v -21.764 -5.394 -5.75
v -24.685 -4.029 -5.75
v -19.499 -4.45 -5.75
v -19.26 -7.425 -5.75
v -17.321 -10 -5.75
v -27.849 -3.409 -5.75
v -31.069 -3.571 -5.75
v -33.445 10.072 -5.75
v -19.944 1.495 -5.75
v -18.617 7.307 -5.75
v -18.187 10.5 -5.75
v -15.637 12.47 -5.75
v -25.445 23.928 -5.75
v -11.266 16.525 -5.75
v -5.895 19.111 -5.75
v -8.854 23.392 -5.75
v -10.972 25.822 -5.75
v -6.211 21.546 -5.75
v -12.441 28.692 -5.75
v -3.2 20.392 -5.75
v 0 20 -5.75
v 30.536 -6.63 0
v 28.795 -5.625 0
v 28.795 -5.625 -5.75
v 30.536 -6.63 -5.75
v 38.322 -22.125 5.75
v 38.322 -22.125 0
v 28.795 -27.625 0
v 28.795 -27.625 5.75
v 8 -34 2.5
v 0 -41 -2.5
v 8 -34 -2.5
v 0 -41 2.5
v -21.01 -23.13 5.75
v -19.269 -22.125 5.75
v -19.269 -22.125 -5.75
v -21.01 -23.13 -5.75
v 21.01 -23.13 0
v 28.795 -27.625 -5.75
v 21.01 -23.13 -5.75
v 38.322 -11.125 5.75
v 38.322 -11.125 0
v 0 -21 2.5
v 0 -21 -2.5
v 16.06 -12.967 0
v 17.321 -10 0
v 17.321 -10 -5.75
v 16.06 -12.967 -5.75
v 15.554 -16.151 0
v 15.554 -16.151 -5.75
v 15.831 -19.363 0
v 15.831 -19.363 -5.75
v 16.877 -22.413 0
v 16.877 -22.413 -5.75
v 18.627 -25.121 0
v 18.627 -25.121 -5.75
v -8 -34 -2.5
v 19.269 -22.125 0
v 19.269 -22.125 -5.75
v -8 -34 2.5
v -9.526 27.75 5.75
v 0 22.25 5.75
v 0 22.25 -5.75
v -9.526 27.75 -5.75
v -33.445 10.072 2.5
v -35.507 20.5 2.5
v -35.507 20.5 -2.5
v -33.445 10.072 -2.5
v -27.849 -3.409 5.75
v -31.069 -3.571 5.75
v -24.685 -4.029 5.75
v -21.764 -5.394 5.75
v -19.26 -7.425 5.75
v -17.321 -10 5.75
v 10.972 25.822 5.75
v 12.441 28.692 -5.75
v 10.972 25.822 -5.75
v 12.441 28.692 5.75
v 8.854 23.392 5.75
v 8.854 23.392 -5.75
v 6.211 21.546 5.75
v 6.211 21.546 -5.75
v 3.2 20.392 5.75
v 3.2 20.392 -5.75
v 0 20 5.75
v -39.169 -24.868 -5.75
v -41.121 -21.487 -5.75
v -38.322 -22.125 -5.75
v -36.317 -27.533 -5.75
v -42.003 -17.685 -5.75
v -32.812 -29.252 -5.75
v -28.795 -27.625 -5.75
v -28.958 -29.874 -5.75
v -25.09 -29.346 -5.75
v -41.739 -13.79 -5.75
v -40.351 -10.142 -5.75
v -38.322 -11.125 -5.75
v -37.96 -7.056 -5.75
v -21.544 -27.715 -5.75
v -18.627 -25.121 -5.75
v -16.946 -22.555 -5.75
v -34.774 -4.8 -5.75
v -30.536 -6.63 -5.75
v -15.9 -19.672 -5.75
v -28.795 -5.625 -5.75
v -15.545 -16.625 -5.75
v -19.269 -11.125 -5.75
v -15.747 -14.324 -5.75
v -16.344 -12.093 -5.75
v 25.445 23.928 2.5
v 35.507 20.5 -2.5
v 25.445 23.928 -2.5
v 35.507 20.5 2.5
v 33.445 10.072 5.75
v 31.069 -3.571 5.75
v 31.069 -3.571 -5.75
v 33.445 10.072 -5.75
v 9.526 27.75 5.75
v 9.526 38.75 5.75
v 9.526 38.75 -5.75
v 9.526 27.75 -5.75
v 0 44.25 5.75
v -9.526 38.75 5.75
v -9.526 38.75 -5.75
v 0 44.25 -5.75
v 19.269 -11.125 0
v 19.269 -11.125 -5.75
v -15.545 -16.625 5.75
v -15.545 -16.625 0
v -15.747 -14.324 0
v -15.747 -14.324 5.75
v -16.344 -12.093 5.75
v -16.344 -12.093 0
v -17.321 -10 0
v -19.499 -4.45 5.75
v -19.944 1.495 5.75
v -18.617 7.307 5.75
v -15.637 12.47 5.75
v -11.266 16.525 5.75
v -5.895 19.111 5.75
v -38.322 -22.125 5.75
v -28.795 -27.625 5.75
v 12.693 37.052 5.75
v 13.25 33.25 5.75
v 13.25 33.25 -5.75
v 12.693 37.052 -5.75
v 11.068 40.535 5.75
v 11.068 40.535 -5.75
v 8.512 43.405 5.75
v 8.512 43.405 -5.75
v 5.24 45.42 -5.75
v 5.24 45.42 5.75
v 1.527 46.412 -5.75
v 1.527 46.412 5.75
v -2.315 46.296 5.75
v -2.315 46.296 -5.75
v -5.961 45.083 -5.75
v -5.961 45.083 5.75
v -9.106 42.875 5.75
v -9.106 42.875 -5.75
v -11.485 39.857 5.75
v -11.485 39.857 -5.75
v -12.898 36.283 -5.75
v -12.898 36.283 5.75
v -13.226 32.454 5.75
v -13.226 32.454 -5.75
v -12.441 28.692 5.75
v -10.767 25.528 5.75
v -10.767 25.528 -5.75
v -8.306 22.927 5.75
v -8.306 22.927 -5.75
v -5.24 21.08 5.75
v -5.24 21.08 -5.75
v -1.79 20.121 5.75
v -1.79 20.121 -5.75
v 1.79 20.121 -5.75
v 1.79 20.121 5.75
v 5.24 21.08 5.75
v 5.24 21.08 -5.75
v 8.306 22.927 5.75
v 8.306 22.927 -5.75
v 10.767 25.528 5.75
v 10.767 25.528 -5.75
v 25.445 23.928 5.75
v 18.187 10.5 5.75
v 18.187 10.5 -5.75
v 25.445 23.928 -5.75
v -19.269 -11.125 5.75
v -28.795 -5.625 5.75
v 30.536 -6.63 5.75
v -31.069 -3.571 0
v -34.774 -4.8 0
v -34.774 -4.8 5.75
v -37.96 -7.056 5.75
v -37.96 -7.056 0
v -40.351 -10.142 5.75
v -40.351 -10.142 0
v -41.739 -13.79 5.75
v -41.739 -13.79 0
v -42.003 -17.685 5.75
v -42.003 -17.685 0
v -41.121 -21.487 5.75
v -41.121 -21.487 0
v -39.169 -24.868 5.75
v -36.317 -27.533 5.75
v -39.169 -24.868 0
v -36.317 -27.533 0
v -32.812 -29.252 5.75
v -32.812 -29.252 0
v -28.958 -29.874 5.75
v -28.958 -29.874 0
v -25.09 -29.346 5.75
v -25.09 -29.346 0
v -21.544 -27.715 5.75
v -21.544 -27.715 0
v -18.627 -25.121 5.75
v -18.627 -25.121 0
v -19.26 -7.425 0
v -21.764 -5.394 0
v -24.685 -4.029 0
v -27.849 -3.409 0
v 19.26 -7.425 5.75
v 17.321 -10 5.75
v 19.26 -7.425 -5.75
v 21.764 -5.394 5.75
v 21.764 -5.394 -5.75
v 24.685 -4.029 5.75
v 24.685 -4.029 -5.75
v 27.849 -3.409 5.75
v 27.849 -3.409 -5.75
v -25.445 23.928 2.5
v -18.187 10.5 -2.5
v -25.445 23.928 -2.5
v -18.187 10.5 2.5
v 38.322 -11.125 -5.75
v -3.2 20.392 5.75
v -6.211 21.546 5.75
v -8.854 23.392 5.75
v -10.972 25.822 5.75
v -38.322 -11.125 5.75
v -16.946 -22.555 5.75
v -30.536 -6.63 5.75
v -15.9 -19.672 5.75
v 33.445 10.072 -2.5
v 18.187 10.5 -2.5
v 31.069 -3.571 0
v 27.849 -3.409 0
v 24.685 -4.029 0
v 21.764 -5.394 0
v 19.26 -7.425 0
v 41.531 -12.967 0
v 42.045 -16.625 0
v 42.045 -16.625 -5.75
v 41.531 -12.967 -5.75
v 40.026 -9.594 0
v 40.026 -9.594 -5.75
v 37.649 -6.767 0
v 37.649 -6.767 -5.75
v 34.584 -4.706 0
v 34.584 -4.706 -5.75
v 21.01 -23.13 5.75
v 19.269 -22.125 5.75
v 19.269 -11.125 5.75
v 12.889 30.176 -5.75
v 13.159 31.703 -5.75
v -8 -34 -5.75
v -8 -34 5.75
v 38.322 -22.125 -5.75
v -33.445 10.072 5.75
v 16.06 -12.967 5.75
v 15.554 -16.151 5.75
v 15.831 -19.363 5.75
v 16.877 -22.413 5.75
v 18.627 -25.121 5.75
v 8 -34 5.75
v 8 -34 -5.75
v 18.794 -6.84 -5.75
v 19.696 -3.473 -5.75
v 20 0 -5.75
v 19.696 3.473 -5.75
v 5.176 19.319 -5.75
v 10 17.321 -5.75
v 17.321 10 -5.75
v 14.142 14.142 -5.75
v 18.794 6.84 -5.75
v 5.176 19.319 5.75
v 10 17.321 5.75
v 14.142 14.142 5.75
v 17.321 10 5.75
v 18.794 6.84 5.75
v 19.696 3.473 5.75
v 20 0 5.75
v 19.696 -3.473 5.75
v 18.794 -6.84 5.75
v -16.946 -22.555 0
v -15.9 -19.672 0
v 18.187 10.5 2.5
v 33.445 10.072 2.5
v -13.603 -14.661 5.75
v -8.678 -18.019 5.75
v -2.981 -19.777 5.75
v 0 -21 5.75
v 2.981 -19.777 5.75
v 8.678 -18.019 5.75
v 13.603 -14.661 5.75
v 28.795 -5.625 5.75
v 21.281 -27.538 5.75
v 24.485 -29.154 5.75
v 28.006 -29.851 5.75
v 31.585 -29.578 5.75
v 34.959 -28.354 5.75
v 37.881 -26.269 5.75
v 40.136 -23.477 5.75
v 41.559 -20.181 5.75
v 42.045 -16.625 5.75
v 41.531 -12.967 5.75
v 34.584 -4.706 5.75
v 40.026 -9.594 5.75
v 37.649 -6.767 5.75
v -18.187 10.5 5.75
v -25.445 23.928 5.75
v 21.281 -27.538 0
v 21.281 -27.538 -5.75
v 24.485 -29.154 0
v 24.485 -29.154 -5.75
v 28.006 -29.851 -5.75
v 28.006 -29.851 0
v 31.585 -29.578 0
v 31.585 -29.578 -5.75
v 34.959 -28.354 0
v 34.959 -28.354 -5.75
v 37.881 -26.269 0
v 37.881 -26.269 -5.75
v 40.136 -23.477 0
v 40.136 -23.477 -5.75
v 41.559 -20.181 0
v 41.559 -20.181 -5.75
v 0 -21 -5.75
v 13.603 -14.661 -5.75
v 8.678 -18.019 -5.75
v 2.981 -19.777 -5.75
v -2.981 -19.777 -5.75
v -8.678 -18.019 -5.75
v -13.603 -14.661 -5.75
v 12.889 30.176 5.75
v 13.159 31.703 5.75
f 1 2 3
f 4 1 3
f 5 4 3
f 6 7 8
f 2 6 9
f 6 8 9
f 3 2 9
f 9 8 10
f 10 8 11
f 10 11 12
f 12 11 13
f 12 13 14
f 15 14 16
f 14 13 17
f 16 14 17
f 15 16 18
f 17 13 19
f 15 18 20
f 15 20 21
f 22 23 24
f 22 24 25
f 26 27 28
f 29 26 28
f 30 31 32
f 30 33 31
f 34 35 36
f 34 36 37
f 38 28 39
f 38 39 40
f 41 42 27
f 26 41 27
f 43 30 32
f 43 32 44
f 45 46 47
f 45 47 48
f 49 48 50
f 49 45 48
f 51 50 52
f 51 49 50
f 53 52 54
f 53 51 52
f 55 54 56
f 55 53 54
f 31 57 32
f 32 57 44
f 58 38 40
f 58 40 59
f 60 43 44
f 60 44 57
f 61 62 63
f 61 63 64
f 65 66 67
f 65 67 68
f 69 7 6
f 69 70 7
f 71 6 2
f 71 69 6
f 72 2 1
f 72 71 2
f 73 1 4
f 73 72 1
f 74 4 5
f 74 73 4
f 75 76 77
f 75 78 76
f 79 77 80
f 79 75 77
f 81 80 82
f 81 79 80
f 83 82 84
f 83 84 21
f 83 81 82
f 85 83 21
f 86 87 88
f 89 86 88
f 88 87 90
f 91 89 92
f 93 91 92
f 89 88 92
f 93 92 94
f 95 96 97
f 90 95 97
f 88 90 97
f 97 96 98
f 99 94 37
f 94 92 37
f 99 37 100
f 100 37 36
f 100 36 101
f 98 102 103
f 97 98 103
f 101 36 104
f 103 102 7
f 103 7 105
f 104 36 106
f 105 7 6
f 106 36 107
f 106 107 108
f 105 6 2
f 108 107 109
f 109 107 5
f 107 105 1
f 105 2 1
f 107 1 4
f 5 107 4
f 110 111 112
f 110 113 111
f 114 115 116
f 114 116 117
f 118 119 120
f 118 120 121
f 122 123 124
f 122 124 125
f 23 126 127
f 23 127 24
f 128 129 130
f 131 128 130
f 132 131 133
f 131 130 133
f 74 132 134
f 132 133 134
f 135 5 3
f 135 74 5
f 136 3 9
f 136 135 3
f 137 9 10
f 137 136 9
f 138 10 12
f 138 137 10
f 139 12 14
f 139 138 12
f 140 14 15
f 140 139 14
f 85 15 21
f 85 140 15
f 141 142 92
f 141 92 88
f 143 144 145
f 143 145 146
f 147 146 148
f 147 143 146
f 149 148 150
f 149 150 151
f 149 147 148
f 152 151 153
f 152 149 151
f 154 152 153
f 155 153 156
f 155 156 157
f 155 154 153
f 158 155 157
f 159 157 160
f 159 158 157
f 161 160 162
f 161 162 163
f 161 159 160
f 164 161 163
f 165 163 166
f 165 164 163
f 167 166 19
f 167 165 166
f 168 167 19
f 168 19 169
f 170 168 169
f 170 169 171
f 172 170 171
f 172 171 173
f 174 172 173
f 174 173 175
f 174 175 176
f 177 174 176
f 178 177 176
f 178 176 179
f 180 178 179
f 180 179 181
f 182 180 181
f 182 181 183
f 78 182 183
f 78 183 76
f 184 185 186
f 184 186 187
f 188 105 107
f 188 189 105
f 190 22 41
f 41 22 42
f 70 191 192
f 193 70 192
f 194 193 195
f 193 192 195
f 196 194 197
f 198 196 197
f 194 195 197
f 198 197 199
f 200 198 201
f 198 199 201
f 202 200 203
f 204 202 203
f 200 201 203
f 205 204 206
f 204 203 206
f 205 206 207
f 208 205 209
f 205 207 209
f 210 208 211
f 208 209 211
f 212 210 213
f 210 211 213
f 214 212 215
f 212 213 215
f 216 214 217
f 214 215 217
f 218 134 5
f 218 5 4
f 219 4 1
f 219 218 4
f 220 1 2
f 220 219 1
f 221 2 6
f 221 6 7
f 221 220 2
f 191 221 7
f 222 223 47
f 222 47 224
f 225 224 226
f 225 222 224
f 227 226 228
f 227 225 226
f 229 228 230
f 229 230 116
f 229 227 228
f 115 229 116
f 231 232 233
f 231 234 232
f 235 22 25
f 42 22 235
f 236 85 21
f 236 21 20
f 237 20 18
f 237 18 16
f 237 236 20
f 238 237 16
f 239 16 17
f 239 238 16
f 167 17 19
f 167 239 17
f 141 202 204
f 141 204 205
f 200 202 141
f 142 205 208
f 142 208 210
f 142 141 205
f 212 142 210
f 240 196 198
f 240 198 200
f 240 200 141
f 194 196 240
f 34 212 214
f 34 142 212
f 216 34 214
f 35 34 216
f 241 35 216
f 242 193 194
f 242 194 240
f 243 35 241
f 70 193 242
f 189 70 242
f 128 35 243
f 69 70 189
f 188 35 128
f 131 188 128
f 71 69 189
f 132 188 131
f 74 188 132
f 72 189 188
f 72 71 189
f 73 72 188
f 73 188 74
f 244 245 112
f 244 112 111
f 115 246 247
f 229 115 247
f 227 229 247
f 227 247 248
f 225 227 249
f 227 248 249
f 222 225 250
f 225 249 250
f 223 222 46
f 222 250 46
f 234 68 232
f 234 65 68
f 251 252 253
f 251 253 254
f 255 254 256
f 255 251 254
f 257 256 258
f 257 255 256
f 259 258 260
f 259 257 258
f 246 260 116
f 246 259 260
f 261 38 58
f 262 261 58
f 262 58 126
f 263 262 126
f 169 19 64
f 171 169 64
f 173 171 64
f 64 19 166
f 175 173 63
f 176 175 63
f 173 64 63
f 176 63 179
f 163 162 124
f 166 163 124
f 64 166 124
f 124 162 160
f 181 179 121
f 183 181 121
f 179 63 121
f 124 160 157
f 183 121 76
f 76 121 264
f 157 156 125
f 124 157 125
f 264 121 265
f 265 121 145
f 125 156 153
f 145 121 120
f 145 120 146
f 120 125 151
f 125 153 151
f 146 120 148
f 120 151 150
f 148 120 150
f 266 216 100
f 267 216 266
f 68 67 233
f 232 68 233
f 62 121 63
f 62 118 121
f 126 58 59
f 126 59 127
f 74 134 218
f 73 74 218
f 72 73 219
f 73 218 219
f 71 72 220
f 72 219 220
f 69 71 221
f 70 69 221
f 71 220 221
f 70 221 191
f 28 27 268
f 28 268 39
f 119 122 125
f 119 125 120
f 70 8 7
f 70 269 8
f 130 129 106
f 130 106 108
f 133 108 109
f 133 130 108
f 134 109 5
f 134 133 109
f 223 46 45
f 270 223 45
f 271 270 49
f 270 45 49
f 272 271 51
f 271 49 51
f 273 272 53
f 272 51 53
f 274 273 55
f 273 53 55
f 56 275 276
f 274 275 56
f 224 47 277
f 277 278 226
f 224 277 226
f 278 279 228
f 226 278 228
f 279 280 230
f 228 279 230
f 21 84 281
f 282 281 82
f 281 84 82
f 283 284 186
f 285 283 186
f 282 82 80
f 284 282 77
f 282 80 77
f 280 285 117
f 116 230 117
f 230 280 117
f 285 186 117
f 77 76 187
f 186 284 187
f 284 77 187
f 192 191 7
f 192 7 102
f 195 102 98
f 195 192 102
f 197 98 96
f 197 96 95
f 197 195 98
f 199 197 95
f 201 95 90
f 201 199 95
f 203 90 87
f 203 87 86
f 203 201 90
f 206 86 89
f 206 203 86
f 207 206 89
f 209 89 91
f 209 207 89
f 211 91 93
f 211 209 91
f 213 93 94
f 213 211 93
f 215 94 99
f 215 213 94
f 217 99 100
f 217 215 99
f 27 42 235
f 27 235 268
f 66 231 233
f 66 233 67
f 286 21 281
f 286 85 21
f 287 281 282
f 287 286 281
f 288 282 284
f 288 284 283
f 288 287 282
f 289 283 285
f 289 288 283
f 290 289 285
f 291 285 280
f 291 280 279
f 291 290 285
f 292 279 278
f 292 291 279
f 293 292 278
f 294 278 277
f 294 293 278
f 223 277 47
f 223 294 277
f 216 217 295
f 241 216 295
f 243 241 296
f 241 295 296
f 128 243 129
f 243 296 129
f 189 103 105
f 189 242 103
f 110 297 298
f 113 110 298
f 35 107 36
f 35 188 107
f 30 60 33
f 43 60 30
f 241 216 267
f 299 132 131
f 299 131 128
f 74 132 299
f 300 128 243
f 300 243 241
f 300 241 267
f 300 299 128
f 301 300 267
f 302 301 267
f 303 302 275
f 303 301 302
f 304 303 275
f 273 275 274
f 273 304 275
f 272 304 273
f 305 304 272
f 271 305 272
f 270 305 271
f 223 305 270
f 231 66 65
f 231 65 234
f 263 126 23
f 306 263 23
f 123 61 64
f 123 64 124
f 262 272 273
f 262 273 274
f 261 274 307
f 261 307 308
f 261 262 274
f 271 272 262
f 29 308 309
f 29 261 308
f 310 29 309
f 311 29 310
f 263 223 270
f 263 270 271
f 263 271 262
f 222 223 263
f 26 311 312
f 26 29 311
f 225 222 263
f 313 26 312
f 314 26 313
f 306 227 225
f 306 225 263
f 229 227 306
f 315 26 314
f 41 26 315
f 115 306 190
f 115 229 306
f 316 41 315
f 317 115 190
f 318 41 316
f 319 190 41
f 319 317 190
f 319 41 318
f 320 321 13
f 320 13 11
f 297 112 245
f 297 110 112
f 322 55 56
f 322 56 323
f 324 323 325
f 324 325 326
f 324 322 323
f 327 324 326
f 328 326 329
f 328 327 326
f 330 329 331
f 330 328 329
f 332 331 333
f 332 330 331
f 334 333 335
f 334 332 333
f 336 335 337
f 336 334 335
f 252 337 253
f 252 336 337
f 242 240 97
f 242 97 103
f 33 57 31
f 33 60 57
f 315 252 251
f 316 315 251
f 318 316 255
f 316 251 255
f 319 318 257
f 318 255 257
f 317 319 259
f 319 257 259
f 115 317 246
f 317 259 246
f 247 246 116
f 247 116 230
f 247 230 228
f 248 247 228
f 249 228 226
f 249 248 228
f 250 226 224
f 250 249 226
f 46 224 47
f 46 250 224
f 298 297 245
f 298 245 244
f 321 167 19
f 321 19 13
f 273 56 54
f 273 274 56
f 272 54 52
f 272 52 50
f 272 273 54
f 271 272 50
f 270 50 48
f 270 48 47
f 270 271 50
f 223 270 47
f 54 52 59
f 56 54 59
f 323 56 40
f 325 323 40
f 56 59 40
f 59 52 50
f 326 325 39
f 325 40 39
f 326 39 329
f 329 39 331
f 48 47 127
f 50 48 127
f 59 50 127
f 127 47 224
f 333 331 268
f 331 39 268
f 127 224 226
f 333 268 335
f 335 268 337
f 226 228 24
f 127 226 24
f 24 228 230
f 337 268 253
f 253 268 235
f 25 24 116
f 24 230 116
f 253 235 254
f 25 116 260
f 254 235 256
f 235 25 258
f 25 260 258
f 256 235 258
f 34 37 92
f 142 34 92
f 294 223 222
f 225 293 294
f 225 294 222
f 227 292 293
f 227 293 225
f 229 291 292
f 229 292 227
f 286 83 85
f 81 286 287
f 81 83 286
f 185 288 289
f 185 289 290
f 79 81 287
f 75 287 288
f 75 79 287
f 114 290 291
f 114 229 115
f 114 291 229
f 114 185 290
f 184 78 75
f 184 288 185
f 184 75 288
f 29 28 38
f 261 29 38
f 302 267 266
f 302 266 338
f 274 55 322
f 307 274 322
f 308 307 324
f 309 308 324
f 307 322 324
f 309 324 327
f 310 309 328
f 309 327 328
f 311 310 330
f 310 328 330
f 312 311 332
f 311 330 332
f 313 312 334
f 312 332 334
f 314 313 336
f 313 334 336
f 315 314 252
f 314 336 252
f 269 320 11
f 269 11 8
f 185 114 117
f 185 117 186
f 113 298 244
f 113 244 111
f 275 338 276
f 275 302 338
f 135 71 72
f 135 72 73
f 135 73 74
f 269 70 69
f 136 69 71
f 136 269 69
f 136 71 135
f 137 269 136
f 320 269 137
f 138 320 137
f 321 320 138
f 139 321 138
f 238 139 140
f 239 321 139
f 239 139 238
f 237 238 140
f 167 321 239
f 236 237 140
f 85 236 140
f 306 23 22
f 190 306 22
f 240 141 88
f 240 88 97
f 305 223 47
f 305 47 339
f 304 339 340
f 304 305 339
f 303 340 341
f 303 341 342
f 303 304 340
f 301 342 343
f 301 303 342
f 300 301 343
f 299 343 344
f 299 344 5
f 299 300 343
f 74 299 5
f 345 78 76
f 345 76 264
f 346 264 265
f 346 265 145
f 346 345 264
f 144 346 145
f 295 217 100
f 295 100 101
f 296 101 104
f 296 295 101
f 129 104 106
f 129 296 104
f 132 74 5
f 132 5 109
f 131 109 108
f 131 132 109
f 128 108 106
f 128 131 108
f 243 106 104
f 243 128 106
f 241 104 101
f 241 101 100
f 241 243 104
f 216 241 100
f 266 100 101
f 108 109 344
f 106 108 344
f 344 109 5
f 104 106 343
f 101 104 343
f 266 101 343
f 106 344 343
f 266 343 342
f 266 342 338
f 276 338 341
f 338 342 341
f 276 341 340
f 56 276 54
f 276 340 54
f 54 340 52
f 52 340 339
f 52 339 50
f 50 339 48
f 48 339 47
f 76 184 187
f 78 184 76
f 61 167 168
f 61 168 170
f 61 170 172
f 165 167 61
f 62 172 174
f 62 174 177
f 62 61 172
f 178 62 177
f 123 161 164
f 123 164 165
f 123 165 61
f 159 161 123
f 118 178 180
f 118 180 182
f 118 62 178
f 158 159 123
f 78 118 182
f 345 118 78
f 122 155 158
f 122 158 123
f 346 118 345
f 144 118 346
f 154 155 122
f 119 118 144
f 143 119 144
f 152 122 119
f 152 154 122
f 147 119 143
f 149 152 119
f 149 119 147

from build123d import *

# Parameters (mm, degrees)
F1_DEPTH = 5.75
F2_DEPTH = 2.5
F3_DEPTH = 5.75


with BuildPart() as f1:
    # F0 (on Top) → F1 (new body, symmetric)
    with BuildSketch(Plane.XY):
        with BuildLine():
            ThreePointArc((4.1e-09, 20), (10.0000000018, 17.3205080747), (17.3205080757, 10))
            Line((17.3205080757, 10), (18.1865334795, 10.5))
            Line((18.1865334795, 10.5), (25.4448637287, 23.9282032303))
            Line((25.4448637287, 23.9282032303), (12.4413728802, 28.6920683576))
            ThreePointArc((12.4413728802, 28.6920683576), (7.5884750046, 22.3882530362), (4.1e-09, 20))
        make_face()
        with BuildLine():
            ThreePointArc((17.3205080757, 10), (19.3185165258, 5.1763809021), (20, 0))
            ThreePointArc((20, 0), (19.3185165739, -5.1763807226), (17.3205082615, -9.9999996782))
            ThreePointArc((17.3205082615, -9.9999996782), (23.1830335444, -4.6223143104), (31.0687465249, -3.5714892066))
            Line((31.0687465249, -3.5714892066), (33.4448637287, 10.0717967697))
            Line((33.4448637287, 10.0717967697), (18.1865334795, 10.5))
            Line((18.1865334795, 10.5), (17.3205080757, 10))
        make_face()
    extrude(amount=F1_DEPTH, both=True)


with BuildPart() as f1b:
    # F0 (on Top) → F1, piece 2 (new body, symmetric)
    with BuildSketch(Plane.XY):
        with BuildLine():
            ThreePointArc((18.6273736447, -25.120579151), (15.5945583573, -17.7659384609), (17.3205082615, -9.9999996782))
            ThreePointArc((17.3205082615, -9.9999996782), (1.727e-07, -20), (-17.3205080887, -9.9999999774))
            ThreePointArc((-17.3205080887, -9.9999999774), (-15.9968274809, -13.1956476398), (-15.5453446758, -16.625))
            ThreePointArc((-15.5453446758, -16.625), (-16.3396609097, -21.1436770098), (-18.6273736447, -25.120579151))
            Line((-18.6273736447, -25.120579151), (-8, -34))
            Line((-8, -34), (0, -21))
            Line((0, -21), (8, -34))
            Line((8, -34), (18.6273736447, -25.120579151))
        make_face()
    extrude(amount=F1_DEPTH, both=True)


with BuildPart() as f1c:
    # F0 (on Top) → F1, piece 3 (new body, symmetric)
    with BuildSketch(Plane.XY):
        with BuildLine():
            ThreePointArc((-17.3205080887, -9.9999999774), (-17.3205080681, 10.0000000131), (4.1e-09, 20))
            ThreePointArc((4.1e-09, 20), (-7.5884750012, 22.3882530339), (-12.4413728802, 28.6920683576))
            Line((-12.4413728802, 28.6920683576), (-25.4448637287, 23.9282032303))
            Line((-25.4448637287, 23.9282032303), (-18.1865334795, 10.5))
            Line((-18.1865334795, 10.5), (-33.4448637287, 10.0717967697))
            Line((-33.4448637287, 10.0717967697), (-31.0687465249, -3.5714892066))
            ThreePointArc((-31.0687465249, -3.5714892066), (-23.183033388, -4.6223143835), (-17.3205080887, -9.9999999774))
        make_face()
    extrude(amount=F1_DEPTH, both=True)


with BuildPart() as f2:
    # F0 (on Top) → F2 (new body, symmetric)
    with BuildSketch(Plane.XY):
        Polygon((25.4448637287, 23.9282032303), (18.1865334795, 10.5), (29.4448637287, 17), (35.5070415552, 20.5), align=None)
        Polygon((35.5070415552, 20.5), (29.4448637287, 17), (33.4448637287, 10.0717967697), align=None)
        Polygon((29.4448637287, 17), (18.1865334795, 10.5), (33.4448637287, 10.0717967697), align=None)
    extrude(amount=F2_DEPTH, both=True)


with BuildPart() as f2b:
    # F0 (on Top) → F2, piece 2 (new body, symmetric)
    with BuildSketch(Plane.XY):
        Polygon((-18.1865334795, 10.5), (-25.4448637287, 23.9282032303), (-35.5070415552, 20.5), (-33.4448637287, 10.0717967697), align=None)
    extrude(amount=F2_DEPTH, both=True)


with BuildPart() as f2c:
    # F0 (on Top) → F2, piece 3 (new body, symmetric)
    with BuildSketch(Plane.XY):
        Polygon((0, -41), (8, -34), (0, -21), (-8, -34), align=None)
    extrude(amount=F2_DEPTH, both=True)


with BuildPart() as f3:
    # F0 (on Top) → F3 (new body, symmetric)
    with BuildSketch(Plane.XY):
        with BuildLine():
            ThreePointArc((42.0453446758, -16.625), (38.9364756409, -8.097399942), (31.0687465249, -3.5714892066))
            Line((31.0687465249, -3.5714892066), (30.6826971543, -5.7881231149))
            ThreePointArc((30.6826971543, -5.7881231149), (35.0952107159, -7.6077006329), (38.3216241175, -11.125))
            ThreePointArc((38.3216241175, -11.125), (39.420528765, -13.7779905039), (39.7953446758, -16.625))
            ThreePointArc((39.7953446758, -16.625), (39.420528765, -19.4720094961), (38.3216241175, -22.125))
            ThreePointArc((38.3216241175, -22.125), (34.2953446758, -26.1512794416), (28.7953446758, -27.625))
            ThreePointArc((28.7953446758, -27.625), (24.1360673704, -26.5894937147), (20.3540102349, -23.6779336348))
            Line((20.3540102349, -23.6779336348), (18.6273736447, -25.120579151))
            ThreePointArc((18.6273736447, -25.120579151), (33.3140216856, -29.0806837661), (42.0453446758, -16.625))
        make_face()
        with BuildLine():
            ThreePointArc((38.3216241175, -11.125), (35.0952107159, -7.6077006329), (30.6826971543, -5.7881231149))
            Line((30.6826971543, -5.7881231149), (30.5360738949, -6.6300104832))
            Line((30.5360738949, -6.6300104832), (38.3216241175, -11.125))
        make_face()
        with BuildLine():
            ThreePointArc((39.7953446758, -16.625), (39.420528765, -13.7779905039), (38.3216241175, -11.125))
            Line((38.3216241175, -11.125), (38.3216241175, -22.125))
            ThreePointArc((38.3216241175, -22.125), (39.420528765, -19.4720094961), (39.7953446758, -16.625))
        make_face()
        with BuildLine():
            Line((38.3216241175, -22.125), (28.7953446758, -27.625))
            ThreePointArc((28.7953446758, -27.625), (34.2953446758, -26.1512794416), (38.3216241175, -22.125))
        make_face()
        with BuildLine():
            Line((21.0097944532, -23.1300104832), (20.3540102349, -23.6779336348))
            ThreePointArc((20.3540102349, -23.6779336348), (24.1360673704, -26.5894937147), (28.7953446758, -27.625))
            Line((28.7953446758, -27.625), (21.0097944532, -23.1300104832))
        make_face()
        with BuildLine():
            ThreePointArc((19.2690652342, -11.125), (17.7953446758, -16.625), (19.2690652342, -22.125))
            Line((19.2690652342, -22.125), (19.2690652342, -11.125))
        make_face()
        with BuildLine():
            Line((19.2690652342, -11.125), (28.7953446758, -5.625))
            ThreePointArc((28.7953446758, -5.625), (23.2953446758, -7.0987205584), (19.2690652342, -11.125))
        make_face()
        with BuildLine():
            Line((30.5360738949, -6.6300104832), (30.6826971543, -5.7881231149))
            ThreePointArc((30.6826971543, -5.7881231149), (29.7425390234, -5.6658566545), (28.7953446758, -5.625))
            Line((28.7953446758, -5.625), (30.5360738949, -6.6300104832))
        make_face()
        with BuildLine():
            ThreePointArc((31.0687465249, -3.5714892066), (23.1830335444, -4.6223143104), (17.3205082615, -9.9999996782))
            ThreePointArc((17.3205082615, -9.9999996782), (15.5945583573, -17.7659384609), (18.6273736447, -25.120579151))
            Line((18.6273736447, -25.120579151), (20.3540102349, -23.6779336348))
            ThreePointArc((20.3540102349, -23.6779336348), (19.7780453087, -22.9248660401), (19.2690652342, -22.125))
            ThreePointArc((19.2690652342, -22.125), (17.7953446758, -16.625), (19.2690652342, -11.125))
            ThreePointArc((19.2690652342, -11.125), (23.2953446758, -7.0987205584), (28.7953446758, -5.625))
            ThreePointArc((28.7953446758, -5.625), (29.7425390234, -5.6658566545), (30.6826971543, -5.7881231149))
            Line((30.6826971543, -5.7881231149), (31.0687465249, -3.5714892066))
        make_face()
        with BuildLine():
            ThreePointArc((19.2690652342, -22.125), (19.7780453087, -22.9248660401), (20.3540102349, -23.6779336348))
            Line((20.3540102349, -23.6779336348), (21.0097944532, -23.1300104832))
            Line((21.0097944532, -23.1300104832), (19.2690652342, -22.125))
        make_face()
    extrude(amount=F3_DEPTH, both=True)


with BuildPart() as f3b:
    # F0 (on Top) → F3, piece 2 (new body, symmetric)
    with BuildSketch(Plane.XY):
        with BuildLine():
            Line((-19.2690652342, -11.125), (-19.2690652342, -22.125))
            ThreePointArc((-19.2690652342, -22.125), (-18.1701605867, -19.4720094961), (-17.7953446758, -16.625))
            ThreePointArc((-17.7953446758, -16.625), (-18.1701605867, -13.7779905039), (-19.2690652342, -11.125))
        make_face()
        with BuildLine():
            ThreePointArc((-15.5453446758, -16.625), (-15.9968274809, -13.1956476398), (-17.3205080887, -9.9999999774))
            ThreePointArc((-17.3205080887, -9.9999999774), (-23.183033388, -4.6223143835), (-31.0687465249, -3.5714892066))
            Line((-31.0687465249, -3.5714892066), (-30.6826971543, -5.7881231149))
            ThreePointArc((-30.6826971543, -5.7881231149), (-29.7425390234, -5.6658566545), (-28.7953446758, -5.625))
            ThreePointArc((-28.7953446758, -5.625), (-23.2953446758, -7.0987205584), (-19.2690652342, -11.125))
            ThreePointArc((-19.2690652342, -11.125), (-18.1701605867, -13.7779905039), (-17.7953446758, -16.625))
            ThreePointArc((-17.7953446758, -16.625), (-18.1701605867, -19.4720094961), (-19.2690652342, -22.125))
            ThreePointArc((-19.2690652342, -22.125), (-19.7780453087, -22.9248660401), (-20.3540102349, -23.6779336348))
            Line((-20.3540102349, -23.6779336348), (-18.6273736447, -25.120579151))
            ThreePointArc((-18.6273736447, -25.120579151), (-16.3396609097, -21.1436770098), (-15.5453446758, -16.625))
        make_face()
        with BuildLine():
            Line((-21.0097944532, -23.1300104832), (-20.3540102349, -23.6779336348))
            ThreePointArc((-20.3540102349, -23.6779336348), (-19.7780453087, -22.9248660401), (-19.2690652342, -22.125))
            Line((-19.2690652342, -22.125), (-21.0097944532, -23.1300104832))
        make_face()
        with BuildLine():
            Line((-30.6826971543, -5.7881231149), (-31.0687465249, -3.5714892066))
            ThreePointArc((-31.0687465249, -3.5714892066), (-40.270181276, -23.25), (-18.6273736447, -25.120579151))
            Line((-18.6273736447, -25.120579151), (-20.3540102349, -23.6779336348))
            ThreePointArc((-20.3540102349, -23.6779336348), (-24.1360673704, -26.5894937147), (-28.7953446758, -27.625))
            ThreePointArc((-28.7953446758, -27.625), (-34.2953446758, -26.1512794416), (-38.3216241175, -22.125))
            ThreePointArc((-38.3216241175, -22.125), (-39.7953446758, -16.625), (-38.3216241175, -11.125))
            ThreePointArc((-38.3216241175, -11.125), (-35.0952107159, -7.6077006329), (-30.6826971543, -5.7881231149))
        make_face()
        with BuildLine():
            ThreePointArc((-28.7953446758, -27.625), (-24.1360673704, -26.5894937147), (-20.3540102349, -23.6779336348))
            Line((-20.3540102349, -23.6779336348), (-21.0097944532, -23.1300104832))
            Line((-21.0097944532, -23.1300104832), (-28.7953446758, -27.625))
        make_face()
        with BuildLine():
            ThreePointArc((-38.3216241175, -22.125), (-34.2953446758, -26.1512794416), (-28.7953446758, -27.625))
            Line((-28.7953446758, -27.625), (-38.3216241175, -22.125))
        make_face()
        with BuildLine():
            Line((-38.3216241175, -22.125), (-38.3216241175, -11.125))
            ThreePointArc((-38.3216241175, -11.125), (-39.7953446758, -16.625), (-38.3216241175, -22.125))
        make_face()
        with BuildLine():
            Line((-30.5360738949, -6.6300104832), (-30.6826971543, -5.7881231149))
            ThreePointArc((-30.6826971543, -5.7881231149), (-35.0952107159, -7.6077006329), (-38.3216241175, -11.125))
            Line((-38.3216241175, -11.125), (-30.5360738949, -6.6300104832))
        make_face()
        with BuildLine():
            ThreePointArc((-28.7953446758, -5.625), (-29.7425390234, -5.6658566545), (-30.6826971543, -5.7881231149))
            Line((-30.6826971543, -5.7881231149), (-30.5360738949, -6.6300104832))
            Line((-30.5360738949, -6.6300104832), (-28.7953446758, -5.625))
        make_face()
        with BuildLine():
            ThreePointArc((-19.2690652342, -11.125), (-23.2953446758, -7.0987205584), (-28.7953446758, -5.625))
            Line((-28.7953446758, -5.625), (-19.2690652342, -11.125))
        make_face()
    extrude(amount=F3_DEPTH, both=True)


with BuildPart() as f3c:
    # F0 (on Top) → F3, piece 3 (new body, symmetric)
    with BuildSketch(Plane.XY):
        with BuildLine():
            ThreePointArc((-9.5262794416, 38.75), (-10.9591433455, 34.1971943476), (-10.3286869194, 29.4660567497))
            Line((-10.3286869194, 29.4660567497), (-9.5262794416, 29.7600209664))
            Line((-9.5262794416, 29.7600209664), (-9.5262794416, 38.75))
        make_face()
        with BuildLine():
            ThreePointArc((0, 44.25), (-5.5, 42.7762794416), (-9.5262794416, 38.75))
            Line((-9.5262794416, 38.75), (0, 44.25))
        make_face()
        with BuildLine():
            Line((-9.5262794416, 29.7600209664), (-10.3286869194, 29.4660567497))
            ThreePointArc((-10.3286869194, 29.4660567497), (-9.9644937147, 28.5907226946), (-9.5262794416, 27.75))
            Line((-9.5262794416, 27.75), (-9.5262794416, 29.7600209664))
        make_face()
        with BuildLine():
            Line((0, 22.25), (-9.5262794416, 27.75))
            ThreePointArc((-9.5262794416, 27.75), (-5.5, 23.7237205584), (0, 22.25))
        make_face()
        with BuildLine():
            ThreePointArc((-12.4413728802, 28.6920683576), (-7.5884750012, 22.3882530339), (4.1e-09, 20))
            ThreePointArc((4.1e-09, 20), (7.5884750046, 22.3882530362), (12.4413728802, 28.6920683576))
            Line((12.4413728802, 28.6920683576), (10.3286869194, 29.4660567497))
            ThreePointArc((10.3286869194, 29.4660567497), (9.9644937147, 28.5907226946), (9.5262794416, 27.75))
            ThreePointArc((9.5262794416, 27.75), (5.5, 23.7237205584), (0, 22.25))
            ThreePointArc((0, 22.25), (-5.5, 23.7237205584), (-9.5262794416, 27.75))
            ThreePointArc((-9.5262794416, 27.75), (-9.9644937147, 28.5907226946), (-10.3286869194, 29.4660567497))
            Line((-10.3286869194, 29.4660567497), (-12.4413728802, 28.6920683576))
        make_face()
        with BuildLine():
            ThreePointArc((0, 22.25), (5.5, 23.7237205584), (9.5262794416, 27.75))
            Line((9.5262794416, 27.75), (0, 22.25))
        make_face()
        with BuildLine():
            Line((9.5262794416, 29.7600209664), (10.3286869194, 29.4660567497))
            ThreePointArc((10.3286869194, 29.4660567497), (10.830871528, 31.328484467), (11, 33.25))
            ThreePointArc((11, 33.25), (10.6251840892, 36.0970094961), (9.5262794416, 38.75))
            Line((9.5262794416, 38.75), (9.5262794416, 29.7600209664))
        make_face()
        with BuildLine():
            ThreePointArc((13.25, 33.25), (-2.3145528011, 46.2962770678), (-12.4413728802, 28.6920683576))
            Line((-12.4413728802, 28.6920683576), (-10.3286869194, 29.4660567497))
            ThreePointArc((-10.3286869194, 29.4660567497), (-10.9591433455, 34.1971943476), (-9.5262794416, 38.75))
            ThreePointArc((-9.5262794416, 38.75), (-5.5, 42.7762794416), (0, 44.25))
            ThreePointArc((0, 44.25), (5.5, 42.7762794416), (9.5262794416, 38.75))
            ThreePointArc((9.5262794416, 38.75), (10.6251840892, 36.0970094961), (11, 33.25))
            ThreePointArc((11, 33.25), (10.830871528, 31.328484467), (10.3286869194, 29.4660567497))
            Line((10.3286869194, 29.4660567497), (12.4413728802, 28.6920683576))
            ThreePointArc((12.4413728802, 28.6920683576), (13.0462770678, 30.9354471989), (13.25, 33.25))
        make_face()
        with BuildLine():
            ThreePointArc((9.5262794416, 38.75), (5.5, 42.7762794416), (0, 44.25))
            Line((0, 44.25), (9.5262794416, 38.75))
        make_face()
        with BuildLine():
            ThreePointArc((9.5262794416, 27.75), (9.9644937147, 28.5907226946), (10.3286869194, 29.4660567497))
            Line((10.3286869194, 29.4660567497), (9.5262794416, 29.7600209664))
            Line((9.5262794416, 29.7600209664), (9.5262794416, 27.75))
        make_face()
    extrude(amount=F3_DEPTH, both=True)


solid = Compound([f1.part, f1b.part, f1c.part, f2.part, f2b.part, f2c.part, f3.part, f3b.part, f3c.part])
